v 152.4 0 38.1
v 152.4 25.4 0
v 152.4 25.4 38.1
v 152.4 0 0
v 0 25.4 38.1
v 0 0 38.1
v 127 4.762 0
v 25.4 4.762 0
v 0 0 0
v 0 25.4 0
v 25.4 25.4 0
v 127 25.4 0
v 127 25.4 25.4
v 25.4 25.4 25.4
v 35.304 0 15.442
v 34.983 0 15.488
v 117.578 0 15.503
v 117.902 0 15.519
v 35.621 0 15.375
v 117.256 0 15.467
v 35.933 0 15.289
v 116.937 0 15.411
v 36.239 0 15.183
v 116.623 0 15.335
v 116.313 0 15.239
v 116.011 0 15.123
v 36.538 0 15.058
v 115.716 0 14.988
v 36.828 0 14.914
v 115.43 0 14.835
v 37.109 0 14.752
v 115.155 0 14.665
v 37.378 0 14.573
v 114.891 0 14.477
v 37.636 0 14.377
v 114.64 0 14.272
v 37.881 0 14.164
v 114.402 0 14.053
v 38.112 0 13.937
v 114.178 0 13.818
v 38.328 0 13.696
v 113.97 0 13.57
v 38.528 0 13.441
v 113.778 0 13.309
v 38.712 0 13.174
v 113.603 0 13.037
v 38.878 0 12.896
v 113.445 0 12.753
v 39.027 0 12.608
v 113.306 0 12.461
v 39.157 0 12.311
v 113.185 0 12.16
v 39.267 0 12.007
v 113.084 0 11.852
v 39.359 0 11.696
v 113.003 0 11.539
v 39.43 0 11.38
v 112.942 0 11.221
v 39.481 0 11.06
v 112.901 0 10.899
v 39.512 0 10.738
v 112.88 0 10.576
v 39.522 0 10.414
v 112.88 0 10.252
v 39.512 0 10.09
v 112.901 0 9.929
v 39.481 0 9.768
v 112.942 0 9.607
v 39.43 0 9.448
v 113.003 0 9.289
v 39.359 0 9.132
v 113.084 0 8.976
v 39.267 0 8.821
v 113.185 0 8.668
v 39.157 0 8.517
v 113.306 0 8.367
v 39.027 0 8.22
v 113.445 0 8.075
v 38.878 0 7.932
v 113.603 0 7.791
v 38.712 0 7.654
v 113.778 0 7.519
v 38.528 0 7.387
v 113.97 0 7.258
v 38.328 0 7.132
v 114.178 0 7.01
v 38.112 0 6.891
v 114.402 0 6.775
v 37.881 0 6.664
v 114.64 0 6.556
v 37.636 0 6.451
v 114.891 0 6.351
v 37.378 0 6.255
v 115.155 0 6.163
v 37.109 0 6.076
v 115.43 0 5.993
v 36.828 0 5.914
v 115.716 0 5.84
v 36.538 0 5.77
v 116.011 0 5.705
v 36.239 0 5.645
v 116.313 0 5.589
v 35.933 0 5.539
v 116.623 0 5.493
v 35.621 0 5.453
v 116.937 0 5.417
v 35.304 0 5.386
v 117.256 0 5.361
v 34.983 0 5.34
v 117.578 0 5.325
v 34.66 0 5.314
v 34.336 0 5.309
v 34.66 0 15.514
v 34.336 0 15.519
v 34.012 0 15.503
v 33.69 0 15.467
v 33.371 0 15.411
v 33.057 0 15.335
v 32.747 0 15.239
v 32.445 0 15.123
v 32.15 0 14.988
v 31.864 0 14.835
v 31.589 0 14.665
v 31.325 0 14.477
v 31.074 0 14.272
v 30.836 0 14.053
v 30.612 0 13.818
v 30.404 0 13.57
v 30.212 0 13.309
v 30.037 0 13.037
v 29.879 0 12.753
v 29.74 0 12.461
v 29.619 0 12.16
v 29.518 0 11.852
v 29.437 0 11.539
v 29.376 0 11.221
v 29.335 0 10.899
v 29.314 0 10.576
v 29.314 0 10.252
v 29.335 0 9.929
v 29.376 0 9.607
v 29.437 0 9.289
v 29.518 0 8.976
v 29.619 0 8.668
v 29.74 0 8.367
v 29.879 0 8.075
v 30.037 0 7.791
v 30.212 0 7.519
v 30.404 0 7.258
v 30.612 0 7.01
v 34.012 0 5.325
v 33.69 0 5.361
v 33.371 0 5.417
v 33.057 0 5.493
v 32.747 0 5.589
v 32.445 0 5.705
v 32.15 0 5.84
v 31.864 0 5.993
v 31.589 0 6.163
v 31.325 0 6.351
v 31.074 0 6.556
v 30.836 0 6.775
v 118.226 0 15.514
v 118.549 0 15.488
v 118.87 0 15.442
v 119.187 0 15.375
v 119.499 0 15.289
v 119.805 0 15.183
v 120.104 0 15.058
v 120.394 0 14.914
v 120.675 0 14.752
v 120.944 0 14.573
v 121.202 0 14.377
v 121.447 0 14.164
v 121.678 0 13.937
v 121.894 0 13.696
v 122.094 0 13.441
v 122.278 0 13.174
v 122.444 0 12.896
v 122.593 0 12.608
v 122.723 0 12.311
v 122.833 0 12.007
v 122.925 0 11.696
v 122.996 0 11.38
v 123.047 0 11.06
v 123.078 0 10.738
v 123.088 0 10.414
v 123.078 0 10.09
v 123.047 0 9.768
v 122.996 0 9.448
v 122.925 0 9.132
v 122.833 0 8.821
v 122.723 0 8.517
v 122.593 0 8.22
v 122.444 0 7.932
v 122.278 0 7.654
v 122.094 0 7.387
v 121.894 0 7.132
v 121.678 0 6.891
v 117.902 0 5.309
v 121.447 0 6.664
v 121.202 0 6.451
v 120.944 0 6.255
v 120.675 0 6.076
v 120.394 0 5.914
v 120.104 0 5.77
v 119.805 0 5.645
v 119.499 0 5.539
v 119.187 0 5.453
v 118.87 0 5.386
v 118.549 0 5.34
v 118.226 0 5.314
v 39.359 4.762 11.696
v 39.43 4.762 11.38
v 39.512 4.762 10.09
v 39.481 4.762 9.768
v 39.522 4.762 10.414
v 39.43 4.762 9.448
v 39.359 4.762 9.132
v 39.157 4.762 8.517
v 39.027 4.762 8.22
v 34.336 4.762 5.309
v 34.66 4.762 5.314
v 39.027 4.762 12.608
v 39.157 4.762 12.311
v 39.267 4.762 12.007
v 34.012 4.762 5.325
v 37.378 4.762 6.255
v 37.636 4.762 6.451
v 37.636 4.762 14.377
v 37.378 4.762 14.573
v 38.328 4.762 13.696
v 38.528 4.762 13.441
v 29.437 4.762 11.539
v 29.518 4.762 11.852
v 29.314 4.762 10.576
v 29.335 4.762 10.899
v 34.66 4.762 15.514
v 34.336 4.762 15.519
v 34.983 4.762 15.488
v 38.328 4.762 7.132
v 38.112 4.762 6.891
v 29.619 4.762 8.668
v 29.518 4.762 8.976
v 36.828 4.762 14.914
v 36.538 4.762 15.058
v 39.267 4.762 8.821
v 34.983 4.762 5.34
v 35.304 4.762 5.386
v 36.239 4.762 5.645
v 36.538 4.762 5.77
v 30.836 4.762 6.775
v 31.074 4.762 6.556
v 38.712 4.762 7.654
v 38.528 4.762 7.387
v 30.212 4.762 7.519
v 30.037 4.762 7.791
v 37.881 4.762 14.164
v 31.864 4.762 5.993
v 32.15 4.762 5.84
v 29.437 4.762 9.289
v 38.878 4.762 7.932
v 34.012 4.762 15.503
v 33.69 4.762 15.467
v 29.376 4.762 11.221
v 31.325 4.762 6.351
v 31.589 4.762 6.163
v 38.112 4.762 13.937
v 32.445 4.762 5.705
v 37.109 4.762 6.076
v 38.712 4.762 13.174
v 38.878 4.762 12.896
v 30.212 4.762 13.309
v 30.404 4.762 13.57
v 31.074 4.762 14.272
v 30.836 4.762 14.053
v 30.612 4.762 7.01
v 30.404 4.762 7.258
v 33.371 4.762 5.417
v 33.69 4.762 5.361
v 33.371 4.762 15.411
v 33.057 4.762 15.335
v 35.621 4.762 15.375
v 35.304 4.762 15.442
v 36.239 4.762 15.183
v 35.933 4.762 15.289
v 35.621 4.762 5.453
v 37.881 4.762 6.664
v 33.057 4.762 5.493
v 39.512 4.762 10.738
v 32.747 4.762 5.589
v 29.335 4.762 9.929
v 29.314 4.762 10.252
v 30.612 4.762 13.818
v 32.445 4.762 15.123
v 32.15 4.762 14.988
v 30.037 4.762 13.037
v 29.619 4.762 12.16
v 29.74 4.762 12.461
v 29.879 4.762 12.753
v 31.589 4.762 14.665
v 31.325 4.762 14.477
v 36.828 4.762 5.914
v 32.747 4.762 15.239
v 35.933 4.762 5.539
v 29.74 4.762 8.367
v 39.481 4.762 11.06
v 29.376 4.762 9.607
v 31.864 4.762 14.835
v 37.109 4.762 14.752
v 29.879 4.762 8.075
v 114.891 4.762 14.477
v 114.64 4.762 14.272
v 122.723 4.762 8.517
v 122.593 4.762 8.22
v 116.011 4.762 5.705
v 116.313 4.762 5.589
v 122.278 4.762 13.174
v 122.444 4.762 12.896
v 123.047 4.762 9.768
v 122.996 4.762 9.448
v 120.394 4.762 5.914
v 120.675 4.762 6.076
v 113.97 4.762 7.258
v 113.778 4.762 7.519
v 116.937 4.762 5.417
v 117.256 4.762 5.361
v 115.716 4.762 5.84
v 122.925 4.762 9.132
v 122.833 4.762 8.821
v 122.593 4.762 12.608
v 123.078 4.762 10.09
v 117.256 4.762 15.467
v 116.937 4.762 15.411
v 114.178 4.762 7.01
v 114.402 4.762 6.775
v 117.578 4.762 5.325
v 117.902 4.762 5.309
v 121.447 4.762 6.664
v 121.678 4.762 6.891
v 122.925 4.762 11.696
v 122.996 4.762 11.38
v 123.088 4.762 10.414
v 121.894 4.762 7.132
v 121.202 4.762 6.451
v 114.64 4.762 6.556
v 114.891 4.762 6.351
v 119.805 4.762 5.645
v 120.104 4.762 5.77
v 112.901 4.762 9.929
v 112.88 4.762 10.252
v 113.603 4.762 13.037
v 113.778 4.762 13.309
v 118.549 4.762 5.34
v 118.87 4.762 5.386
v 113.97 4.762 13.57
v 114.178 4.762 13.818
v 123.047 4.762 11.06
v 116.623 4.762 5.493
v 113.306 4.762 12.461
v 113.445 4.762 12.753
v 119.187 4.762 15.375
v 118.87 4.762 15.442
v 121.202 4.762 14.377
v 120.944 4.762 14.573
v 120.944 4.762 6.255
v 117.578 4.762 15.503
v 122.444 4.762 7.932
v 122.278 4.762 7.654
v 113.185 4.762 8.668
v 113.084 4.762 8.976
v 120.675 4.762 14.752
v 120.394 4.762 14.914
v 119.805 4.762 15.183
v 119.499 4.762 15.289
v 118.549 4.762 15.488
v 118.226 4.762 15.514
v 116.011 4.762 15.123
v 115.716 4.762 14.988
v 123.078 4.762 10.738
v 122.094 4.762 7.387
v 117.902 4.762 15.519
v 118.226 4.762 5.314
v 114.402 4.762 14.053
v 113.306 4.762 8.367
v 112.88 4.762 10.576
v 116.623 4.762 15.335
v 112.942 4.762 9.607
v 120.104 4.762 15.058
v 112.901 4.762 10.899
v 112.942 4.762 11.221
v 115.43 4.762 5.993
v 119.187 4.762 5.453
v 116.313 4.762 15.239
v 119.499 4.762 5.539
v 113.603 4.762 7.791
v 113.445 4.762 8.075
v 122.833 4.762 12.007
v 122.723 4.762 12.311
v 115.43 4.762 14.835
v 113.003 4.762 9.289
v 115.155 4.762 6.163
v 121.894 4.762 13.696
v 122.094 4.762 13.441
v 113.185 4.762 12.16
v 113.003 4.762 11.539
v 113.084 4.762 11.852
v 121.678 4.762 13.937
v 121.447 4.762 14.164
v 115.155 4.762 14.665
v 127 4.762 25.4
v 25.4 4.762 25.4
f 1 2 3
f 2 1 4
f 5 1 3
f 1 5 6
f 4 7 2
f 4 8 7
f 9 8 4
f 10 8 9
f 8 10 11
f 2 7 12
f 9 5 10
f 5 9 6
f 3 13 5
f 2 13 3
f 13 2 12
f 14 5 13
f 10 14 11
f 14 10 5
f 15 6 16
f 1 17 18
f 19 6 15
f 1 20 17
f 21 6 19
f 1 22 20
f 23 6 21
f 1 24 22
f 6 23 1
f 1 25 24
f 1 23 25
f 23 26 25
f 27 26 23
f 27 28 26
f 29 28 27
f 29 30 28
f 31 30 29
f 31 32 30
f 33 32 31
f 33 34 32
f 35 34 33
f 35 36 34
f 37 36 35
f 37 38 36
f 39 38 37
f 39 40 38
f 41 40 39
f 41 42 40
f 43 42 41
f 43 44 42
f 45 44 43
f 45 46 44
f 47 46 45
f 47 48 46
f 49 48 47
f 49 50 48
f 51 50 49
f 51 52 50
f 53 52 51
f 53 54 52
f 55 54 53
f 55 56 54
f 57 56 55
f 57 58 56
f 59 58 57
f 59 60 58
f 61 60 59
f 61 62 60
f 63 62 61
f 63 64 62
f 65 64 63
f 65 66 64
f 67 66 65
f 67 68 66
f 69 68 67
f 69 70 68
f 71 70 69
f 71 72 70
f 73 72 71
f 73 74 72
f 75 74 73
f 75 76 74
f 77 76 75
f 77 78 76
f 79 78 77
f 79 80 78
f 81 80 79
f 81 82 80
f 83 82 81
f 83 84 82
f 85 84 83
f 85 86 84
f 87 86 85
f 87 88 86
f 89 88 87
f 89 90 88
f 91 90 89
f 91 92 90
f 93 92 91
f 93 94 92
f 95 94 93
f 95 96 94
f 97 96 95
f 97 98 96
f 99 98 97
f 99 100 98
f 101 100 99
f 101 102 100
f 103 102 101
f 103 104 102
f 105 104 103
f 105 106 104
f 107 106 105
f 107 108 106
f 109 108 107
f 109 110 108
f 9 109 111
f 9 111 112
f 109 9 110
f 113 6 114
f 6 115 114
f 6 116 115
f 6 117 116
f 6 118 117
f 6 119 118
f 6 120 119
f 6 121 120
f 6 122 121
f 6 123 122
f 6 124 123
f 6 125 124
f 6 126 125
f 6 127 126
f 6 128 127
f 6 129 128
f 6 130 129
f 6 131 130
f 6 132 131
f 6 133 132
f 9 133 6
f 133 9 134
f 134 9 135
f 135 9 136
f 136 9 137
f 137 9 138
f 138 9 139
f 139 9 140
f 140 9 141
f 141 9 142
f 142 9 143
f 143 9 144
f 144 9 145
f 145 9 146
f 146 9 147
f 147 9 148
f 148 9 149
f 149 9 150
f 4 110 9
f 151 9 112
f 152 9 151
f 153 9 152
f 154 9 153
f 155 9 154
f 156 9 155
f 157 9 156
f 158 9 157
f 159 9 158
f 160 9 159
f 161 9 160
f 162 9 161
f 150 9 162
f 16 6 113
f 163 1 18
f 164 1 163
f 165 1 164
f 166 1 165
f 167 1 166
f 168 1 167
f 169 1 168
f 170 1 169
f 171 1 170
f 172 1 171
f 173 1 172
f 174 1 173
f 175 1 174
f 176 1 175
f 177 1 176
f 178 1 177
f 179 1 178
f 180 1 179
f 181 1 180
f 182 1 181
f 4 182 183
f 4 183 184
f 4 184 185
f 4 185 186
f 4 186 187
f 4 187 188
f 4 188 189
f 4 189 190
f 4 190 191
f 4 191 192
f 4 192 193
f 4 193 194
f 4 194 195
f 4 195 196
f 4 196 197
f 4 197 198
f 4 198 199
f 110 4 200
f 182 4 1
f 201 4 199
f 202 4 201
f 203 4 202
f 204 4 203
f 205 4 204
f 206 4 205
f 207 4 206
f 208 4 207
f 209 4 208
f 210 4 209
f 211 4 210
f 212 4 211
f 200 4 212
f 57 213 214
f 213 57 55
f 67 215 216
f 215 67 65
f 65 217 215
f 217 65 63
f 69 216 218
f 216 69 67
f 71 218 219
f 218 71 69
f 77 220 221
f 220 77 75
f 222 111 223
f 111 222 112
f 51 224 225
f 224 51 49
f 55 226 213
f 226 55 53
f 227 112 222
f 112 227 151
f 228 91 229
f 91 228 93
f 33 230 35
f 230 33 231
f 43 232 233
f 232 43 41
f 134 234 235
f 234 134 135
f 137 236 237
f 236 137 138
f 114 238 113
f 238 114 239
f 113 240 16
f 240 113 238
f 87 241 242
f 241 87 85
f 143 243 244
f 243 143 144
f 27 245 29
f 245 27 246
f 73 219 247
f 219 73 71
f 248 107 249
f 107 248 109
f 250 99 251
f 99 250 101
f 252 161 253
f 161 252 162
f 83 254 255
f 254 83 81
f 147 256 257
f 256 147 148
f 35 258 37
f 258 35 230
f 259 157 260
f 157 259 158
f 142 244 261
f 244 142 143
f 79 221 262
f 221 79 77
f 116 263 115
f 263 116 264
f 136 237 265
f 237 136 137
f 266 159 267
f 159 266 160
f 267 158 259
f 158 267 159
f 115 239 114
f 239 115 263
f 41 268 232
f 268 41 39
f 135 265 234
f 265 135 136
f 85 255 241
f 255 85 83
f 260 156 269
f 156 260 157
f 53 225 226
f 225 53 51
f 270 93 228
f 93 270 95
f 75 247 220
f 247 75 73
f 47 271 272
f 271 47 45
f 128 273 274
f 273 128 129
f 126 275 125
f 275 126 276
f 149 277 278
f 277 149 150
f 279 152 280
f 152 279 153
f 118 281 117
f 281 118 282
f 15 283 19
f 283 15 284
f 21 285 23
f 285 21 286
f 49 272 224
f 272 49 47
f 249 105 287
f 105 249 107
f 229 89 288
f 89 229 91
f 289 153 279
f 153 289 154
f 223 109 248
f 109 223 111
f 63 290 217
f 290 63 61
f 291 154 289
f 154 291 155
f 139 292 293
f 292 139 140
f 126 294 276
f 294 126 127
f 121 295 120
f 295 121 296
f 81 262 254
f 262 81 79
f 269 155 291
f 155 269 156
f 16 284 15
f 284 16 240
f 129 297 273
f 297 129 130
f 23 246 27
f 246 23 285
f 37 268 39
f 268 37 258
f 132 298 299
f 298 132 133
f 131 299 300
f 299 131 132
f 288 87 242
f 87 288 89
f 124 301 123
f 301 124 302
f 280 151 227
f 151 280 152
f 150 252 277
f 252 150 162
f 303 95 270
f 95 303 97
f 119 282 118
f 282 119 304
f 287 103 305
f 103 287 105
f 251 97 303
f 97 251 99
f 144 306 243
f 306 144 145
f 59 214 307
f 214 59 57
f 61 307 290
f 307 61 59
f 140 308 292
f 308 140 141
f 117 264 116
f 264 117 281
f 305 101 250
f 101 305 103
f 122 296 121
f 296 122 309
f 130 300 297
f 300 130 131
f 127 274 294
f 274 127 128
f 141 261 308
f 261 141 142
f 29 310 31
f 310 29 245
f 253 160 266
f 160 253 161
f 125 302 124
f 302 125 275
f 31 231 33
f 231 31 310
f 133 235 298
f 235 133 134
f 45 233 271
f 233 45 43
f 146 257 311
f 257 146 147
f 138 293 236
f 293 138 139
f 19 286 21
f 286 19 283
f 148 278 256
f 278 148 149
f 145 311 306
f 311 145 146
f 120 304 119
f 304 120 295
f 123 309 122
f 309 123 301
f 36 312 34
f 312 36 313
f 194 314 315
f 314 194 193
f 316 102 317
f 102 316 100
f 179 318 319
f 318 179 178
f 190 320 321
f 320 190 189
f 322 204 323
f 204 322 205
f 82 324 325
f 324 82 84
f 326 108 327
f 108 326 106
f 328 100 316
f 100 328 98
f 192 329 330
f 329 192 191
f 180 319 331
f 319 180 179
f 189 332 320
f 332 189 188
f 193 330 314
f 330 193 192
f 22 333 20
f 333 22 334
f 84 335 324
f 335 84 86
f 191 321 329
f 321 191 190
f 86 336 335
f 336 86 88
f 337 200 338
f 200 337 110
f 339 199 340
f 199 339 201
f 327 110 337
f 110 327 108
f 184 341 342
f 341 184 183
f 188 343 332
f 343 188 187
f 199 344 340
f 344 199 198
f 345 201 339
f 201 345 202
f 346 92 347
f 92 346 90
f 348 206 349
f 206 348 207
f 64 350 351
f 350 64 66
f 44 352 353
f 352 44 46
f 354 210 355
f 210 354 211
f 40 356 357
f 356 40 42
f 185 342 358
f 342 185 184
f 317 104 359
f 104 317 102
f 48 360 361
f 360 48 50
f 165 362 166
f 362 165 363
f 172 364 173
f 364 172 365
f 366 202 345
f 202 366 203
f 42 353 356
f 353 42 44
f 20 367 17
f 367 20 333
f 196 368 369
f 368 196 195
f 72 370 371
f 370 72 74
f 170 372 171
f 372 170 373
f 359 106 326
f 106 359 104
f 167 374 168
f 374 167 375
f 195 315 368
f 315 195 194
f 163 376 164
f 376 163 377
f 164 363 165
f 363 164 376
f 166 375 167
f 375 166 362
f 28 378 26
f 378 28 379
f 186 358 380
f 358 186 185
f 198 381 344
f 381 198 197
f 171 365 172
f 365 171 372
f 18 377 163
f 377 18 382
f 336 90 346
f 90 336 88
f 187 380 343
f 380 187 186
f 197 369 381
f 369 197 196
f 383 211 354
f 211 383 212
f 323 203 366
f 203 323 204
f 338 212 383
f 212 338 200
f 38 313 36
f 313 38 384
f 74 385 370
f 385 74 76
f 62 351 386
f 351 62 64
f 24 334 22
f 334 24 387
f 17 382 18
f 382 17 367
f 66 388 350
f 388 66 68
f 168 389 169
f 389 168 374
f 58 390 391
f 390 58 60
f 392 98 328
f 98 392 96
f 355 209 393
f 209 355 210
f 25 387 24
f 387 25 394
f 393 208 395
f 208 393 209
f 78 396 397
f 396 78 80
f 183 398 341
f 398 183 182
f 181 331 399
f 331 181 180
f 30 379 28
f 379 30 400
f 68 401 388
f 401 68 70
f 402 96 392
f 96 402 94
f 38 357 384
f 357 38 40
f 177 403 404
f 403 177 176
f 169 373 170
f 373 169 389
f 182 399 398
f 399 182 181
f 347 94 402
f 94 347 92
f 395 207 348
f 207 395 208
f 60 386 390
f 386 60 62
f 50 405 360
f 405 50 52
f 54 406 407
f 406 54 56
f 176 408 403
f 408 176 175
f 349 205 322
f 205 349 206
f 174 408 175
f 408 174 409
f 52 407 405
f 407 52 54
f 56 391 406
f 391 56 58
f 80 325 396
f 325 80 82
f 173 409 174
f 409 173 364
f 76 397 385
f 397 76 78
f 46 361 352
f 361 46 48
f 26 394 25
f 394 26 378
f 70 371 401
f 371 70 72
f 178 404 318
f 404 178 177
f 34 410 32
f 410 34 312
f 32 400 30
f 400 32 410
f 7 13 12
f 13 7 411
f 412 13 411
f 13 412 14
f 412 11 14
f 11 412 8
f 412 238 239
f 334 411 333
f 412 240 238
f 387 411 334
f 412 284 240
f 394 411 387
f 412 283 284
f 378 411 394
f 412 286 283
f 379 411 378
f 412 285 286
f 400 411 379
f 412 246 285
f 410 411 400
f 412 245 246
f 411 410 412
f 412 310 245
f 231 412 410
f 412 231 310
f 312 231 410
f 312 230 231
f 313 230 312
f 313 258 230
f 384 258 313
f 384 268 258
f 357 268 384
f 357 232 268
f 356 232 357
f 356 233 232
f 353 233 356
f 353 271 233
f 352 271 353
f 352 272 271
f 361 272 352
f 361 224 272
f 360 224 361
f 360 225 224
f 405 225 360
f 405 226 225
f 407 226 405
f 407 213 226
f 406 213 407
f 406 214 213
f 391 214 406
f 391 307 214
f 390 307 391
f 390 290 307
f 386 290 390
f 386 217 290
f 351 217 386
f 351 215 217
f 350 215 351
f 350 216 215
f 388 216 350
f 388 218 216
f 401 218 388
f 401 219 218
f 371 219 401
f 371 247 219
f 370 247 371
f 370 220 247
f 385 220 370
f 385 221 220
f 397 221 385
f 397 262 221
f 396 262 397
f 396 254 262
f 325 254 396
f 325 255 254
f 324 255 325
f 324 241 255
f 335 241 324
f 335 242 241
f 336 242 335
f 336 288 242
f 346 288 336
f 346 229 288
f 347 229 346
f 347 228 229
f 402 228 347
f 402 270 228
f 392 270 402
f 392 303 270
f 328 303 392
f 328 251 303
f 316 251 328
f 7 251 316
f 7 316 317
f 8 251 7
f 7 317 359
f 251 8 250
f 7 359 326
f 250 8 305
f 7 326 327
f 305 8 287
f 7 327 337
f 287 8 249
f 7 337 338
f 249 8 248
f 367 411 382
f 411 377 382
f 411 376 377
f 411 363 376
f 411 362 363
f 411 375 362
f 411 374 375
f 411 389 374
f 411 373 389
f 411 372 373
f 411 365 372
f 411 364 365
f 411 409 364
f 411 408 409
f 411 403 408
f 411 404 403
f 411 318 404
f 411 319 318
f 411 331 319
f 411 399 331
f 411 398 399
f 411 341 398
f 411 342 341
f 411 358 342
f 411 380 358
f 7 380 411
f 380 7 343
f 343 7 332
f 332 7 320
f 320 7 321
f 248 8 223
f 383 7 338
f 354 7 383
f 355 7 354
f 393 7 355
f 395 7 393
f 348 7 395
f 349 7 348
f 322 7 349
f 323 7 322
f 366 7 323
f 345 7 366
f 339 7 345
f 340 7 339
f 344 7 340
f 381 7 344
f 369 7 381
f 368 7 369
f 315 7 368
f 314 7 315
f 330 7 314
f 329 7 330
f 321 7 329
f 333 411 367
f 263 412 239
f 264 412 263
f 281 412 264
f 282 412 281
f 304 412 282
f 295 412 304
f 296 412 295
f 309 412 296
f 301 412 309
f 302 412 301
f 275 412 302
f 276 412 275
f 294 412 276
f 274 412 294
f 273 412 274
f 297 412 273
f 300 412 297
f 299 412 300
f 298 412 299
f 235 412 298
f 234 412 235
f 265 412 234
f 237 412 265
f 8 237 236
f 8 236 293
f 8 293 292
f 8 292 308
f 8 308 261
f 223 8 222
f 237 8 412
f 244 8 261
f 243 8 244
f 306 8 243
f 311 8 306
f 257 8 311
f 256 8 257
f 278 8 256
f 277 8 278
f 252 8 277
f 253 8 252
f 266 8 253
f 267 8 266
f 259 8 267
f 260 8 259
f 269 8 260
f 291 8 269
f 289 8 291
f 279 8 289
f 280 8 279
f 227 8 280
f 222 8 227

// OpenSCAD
v_x = 152.4; // 6"
v_y = 25.4; // 1"
v_z = 38.1; // 1.5"
hole_dia = 5.1054; // 0.2010"
hhd = hole_dia / 2;
hole_a_x = 34.417; //1.355
hole_a_z = 10.414; //0.41
hole_b_x = v_x - hole_a_x;
hole_b_z = hole_a_z;
jaw_depth = 4.7625; // 3/16" or 0.1875

cutout_x = 101.6; // 4"
cutout_y = v_y - jaw_depth;
cutout_z = 25.4; // 1"

module bolt_hole(x, y, z, dia) {
    translate([x, -0.001, z])
        rotate([-90, 0, 0])
            cylinder(h=(y + 0.002), r=dia, $fn=99);
}

difference() {
    // vise jaw 
    cube([v_x, v_y, v_z]);
    bolt_hole(hole_a_x, v_y, hole_a_z, hole_dia);
    bolt_hole(hole_b_x, v_y, hole_b_z, hole_dia);
    translate([((v_x - cutout_x) / 2), jaw_depth, 0])
        cube([cutout_x, cutout_y, cutout_z]);

};
